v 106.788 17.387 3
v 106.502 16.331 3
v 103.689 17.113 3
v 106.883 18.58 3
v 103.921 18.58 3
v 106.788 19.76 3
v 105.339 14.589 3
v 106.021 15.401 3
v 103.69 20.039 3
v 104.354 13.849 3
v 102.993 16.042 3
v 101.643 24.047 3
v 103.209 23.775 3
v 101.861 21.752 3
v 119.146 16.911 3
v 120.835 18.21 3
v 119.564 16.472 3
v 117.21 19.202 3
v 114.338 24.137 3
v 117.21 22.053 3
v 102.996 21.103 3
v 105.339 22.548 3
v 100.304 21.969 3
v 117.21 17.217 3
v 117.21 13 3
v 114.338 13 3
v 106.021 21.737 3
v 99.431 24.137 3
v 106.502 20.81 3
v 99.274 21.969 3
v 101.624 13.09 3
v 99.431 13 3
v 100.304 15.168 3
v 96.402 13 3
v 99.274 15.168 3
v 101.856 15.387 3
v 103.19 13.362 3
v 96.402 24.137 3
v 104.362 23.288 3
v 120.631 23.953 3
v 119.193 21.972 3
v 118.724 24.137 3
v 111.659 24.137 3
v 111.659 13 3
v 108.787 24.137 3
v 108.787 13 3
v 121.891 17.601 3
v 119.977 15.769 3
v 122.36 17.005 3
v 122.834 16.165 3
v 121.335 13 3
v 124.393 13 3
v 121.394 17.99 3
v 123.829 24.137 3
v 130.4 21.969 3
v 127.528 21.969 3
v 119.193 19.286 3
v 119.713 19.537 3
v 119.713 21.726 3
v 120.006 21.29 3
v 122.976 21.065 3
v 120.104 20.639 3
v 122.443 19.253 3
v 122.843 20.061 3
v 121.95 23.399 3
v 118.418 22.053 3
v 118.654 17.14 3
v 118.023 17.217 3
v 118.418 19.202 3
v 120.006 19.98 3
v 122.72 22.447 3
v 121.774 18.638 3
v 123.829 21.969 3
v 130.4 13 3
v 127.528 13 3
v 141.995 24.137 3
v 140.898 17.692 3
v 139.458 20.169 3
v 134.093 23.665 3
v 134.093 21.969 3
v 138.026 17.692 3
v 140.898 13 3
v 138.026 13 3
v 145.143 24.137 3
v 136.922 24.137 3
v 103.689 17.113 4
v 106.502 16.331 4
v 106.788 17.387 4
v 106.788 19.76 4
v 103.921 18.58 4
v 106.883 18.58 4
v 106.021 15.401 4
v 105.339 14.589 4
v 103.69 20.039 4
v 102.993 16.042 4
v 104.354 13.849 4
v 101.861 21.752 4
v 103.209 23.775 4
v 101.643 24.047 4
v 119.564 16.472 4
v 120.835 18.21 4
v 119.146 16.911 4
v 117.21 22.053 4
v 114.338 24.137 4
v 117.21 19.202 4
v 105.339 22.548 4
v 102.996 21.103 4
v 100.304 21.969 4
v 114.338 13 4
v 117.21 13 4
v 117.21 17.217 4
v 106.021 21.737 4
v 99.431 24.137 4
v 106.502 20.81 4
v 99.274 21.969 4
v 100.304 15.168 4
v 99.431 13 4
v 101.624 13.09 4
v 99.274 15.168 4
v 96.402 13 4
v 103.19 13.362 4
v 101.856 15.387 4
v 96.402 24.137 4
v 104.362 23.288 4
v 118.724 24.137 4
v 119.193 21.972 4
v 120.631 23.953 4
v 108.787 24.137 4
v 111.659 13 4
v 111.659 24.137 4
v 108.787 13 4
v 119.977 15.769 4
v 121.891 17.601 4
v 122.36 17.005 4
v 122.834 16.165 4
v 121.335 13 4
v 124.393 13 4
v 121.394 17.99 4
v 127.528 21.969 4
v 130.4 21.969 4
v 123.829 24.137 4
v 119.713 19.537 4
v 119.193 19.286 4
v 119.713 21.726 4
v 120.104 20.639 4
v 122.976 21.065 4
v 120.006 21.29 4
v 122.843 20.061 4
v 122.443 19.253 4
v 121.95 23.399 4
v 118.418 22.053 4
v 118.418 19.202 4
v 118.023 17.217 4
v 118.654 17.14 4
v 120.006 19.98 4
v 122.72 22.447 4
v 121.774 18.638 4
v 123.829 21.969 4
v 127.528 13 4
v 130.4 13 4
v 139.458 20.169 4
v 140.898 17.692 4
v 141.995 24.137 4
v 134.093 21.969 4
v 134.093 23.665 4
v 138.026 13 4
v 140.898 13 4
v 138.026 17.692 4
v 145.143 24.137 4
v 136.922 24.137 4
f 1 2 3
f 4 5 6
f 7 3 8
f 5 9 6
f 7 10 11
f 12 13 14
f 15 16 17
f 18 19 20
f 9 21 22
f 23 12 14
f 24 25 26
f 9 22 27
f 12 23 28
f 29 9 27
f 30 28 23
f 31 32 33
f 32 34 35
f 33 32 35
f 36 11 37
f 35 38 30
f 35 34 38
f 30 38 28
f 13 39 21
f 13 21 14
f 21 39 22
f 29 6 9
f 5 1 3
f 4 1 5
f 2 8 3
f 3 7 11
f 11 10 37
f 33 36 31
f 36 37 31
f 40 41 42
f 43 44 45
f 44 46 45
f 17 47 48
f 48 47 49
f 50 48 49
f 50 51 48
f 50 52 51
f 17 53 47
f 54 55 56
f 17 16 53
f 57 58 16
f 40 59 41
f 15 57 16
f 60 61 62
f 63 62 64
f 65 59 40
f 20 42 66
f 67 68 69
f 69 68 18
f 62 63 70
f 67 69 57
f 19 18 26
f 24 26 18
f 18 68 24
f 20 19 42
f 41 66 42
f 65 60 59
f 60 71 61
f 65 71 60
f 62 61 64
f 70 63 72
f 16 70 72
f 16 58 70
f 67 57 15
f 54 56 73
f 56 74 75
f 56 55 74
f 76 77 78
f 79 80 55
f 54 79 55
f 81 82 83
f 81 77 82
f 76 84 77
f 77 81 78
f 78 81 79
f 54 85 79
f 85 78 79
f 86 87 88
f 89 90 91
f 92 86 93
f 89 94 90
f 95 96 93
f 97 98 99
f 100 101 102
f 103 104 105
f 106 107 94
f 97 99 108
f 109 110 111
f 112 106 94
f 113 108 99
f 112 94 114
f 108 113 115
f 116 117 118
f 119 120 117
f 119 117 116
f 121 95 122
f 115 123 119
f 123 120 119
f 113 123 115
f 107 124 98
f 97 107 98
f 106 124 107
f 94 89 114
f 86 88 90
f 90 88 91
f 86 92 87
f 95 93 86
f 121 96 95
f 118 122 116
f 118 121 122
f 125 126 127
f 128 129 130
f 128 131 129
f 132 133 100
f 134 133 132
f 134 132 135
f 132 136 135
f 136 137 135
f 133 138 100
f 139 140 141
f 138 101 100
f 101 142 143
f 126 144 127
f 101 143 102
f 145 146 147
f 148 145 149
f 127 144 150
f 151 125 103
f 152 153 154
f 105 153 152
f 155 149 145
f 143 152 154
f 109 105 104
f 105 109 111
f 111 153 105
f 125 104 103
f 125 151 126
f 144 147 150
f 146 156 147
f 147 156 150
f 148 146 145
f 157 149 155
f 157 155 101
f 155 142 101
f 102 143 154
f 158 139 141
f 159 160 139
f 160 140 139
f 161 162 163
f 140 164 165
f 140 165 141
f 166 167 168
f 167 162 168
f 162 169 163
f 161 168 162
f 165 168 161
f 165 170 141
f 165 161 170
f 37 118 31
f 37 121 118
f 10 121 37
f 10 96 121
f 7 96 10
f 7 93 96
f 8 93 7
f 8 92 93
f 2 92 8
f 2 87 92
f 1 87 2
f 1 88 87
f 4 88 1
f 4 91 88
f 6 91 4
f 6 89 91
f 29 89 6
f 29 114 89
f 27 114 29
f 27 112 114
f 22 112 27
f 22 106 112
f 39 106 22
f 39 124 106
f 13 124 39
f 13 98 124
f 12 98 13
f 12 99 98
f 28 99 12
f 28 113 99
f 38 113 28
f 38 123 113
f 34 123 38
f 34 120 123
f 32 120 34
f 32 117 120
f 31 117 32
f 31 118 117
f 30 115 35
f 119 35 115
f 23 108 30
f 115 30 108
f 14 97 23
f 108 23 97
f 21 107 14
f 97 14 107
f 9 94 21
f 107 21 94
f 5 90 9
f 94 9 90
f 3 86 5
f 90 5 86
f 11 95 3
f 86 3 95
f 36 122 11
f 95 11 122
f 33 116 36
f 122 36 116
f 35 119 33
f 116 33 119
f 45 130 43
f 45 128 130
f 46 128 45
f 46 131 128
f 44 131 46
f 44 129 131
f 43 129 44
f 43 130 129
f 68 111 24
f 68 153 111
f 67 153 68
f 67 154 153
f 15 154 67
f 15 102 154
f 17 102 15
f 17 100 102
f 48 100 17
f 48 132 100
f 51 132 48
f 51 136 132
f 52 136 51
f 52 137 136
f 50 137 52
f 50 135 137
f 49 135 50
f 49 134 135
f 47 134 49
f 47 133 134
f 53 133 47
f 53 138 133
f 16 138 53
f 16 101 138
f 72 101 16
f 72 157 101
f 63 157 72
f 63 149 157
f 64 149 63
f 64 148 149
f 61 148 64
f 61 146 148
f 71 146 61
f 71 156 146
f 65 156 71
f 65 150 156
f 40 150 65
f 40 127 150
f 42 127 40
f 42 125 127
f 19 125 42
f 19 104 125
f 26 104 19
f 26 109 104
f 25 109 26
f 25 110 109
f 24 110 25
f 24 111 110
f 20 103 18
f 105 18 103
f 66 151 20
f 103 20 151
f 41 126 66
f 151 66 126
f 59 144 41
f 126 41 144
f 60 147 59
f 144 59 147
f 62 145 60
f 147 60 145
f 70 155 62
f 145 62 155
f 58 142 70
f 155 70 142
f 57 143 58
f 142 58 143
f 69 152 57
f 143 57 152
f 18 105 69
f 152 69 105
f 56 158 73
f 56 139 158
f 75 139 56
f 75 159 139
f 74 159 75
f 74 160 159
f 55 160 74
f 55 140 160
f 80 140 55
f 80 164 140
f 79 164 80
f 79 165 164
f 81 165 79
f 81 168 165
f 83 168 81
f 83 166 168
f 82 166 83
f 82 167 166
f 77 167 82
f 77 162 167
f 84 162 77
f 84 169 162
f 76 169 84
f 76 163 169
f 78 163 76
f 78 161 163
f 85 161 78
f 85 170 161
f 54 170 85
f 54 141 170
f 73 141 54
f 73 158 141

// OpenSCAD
// oppvaskmaskinskilt, bakgrunn
//fn=$preview?16:256;
fn=8;
$fn=fn;

text="DISHES";
font="Copperplate:style=Bold";

text_clean="CLEAN";
text_dirty="DIRTY";

translate([95,13,3]) {
    linear_extrude(1) {
        text(text_dirty, font=font, size=11, $fn=fn);
    }
}
